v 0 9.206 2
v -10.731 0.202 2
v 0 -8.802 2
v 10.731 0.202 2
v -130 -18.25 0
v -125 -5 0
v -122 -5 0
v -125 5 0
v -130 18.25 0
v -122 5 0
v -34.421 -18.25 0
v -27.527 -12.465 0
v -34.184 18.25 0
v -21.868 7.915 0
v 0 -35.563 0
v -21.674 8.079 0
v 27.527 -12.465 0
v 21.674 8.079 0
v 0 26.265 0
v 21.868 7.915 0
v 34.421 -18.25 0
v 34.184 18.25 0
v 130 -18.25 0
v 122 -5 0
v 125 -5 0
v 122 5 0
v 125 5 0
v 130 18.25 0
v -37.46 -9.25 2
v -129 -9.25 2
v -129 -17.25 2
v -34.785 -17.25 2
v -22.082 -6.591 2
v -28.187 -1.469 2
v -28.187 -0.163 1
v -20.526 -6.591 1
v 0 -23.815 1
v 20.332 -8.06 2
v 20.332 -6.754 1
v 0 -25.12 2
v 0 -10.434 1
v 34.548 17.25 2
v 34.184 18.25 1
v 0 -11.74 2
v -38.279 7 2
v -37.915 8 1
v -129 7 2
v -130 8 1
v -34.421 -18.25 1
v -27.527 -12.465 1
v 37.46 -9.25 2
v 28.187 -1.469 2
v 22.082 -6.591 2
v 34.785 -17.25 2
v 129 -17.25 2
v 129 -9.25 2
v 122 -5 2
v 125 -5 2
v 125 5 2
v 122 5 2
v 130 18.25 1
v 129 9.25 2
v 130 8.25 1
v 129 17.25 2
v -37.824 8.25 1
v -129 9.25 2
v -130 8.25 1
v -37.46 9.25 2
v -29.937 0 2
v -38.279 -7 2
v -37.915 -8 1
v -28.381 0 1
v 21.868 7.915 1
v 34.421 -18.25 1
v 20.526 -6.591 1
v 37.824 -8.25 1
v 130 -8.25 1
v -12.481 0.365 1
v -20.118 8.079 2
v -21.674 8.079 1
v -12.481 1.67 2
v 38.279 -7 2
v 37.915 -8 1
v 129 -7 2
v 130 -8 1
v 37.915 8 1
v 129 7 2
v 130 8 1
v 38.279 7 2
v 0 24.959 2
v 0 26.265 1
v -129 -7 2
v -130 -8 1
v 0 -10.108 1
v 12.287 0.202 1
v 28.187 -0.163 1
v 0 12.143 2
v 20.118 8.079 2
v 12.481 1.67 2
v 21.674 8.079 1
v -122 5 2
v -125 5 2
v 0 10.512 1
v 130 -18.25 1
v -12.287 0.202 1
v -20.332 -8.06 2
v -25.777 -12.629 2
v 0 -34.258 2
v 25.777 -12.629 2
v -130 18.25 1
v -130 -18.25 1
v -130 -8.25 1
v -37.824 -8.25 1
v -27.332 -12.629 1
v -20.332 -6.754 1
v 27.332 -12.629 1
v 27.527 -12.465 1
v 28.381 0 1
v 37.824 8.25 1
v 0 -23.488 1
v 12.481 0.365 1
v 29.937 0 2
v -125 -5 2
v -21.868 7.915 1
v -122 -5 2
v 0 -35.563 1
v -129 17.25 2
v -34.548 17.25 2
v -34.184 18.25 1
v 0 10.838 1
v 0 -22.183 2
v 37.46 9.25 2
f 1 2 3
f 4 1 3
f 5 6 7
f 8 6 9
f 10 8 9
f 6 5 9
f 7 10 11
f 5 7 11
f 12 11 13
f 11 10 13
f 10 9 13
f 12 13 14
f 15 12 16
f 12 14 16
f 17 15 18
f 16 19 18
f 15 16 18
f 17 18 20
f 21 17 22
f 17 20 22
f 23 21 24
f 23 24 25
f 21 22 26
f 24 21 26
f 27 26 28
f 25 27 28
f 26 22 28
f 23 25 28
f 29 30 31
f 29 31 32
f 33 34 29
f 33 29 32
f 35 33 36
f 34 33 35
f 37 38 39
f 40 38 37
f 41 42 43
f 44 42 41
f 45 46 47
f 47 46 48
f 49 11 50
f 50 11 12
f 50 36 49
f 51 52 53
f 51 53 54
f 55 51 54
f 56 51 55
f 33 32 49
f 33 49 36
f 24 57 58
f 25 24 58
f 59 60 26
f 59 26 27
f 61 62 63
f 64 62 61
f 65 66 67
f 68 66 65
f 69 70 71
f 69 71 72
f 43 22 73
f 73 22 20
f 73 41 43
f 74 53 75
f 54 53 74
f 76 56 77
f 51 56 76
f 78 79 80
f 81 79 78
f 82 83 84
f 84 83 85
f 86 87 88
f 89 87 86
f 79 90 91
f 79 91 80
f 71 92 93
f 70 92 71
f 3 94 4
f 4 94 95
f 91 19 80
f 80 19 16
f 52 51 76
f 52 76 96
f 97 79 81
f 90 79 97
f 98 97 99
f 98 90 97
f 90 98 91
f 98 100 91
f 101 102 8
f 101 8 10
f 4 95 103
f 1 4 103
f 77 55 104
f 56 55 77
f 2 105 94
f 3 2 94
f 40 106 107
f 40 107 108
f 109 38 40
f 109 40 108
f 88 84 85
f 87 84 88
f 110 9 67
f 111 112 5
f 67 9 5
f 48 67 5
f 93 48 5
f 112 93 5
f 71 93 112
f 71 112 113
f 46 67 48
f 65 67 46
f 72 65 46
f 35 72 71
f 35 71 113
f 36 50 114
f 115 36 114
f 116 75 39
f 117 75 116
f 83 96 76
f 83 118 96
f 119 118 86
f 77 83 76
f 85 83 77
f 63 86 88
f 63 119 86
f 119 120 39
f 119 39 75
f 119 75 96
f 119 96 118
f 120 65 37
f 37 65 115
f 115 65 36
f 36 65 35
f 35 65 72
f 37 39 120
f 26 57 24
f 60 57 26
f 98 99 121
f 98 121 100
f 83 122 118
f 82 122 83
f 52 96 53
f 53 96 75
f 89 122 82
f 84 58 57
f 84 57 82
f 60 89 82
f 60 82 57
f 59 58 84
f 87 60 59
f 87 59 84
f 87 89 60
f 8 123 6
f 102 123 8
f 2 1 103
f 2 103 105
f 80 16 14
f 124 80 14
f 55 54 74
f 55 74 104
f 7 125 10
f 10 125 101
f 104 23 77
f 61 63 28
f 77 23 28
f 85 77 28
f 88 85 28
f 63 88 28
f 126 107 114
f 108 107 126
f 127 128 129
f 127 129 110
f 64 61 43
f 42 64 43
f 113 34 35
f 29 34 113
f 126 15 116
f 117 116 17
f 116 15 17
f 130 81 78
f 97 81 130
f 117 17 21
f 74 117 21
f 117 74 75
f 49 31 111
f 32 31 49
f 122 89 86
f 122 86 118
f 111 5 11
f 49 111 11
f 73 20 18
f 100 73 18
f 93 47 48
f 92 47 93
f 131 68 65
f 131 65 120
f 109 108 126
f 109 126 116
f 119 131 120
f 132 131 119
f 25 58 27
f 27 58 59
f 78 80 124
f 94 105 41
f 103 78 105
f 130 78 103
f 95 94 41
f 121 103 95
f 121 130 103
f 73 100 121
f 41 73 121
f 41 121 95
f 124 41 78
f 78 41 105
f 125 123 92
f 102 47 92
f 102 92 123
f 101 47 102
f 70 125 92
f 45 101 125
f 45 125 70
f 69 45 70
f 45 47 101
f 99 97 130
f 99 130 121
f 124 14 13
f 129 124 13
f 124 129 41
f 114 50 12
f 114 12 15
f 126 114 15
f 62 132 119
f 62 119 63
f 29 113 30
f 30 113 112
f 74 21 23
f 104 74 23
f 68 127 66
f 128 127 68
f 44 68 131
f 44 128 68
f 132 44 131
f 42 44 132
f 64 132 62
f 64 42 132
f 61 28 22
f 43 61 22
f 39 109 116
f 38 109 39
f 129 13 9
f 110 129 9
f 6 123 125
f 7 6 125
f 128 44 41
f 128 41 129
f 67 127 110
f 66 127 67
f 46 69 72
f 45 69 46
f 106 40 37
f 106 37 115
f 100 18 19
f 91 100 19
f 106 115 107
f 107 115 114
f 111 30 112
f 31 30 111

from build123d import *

# Parameters (mm, degrees)
F1_DEPTH  = 2
F3_DEPTH  = 2
F5_DEPTH  = 2
F7_DEPTH  = 2
F9_DEPTH  = 1
F10_SIZE  = 0.99999
F11_W     = 3
F11_H     = 10
F12_DEPTH = 2


# Not quite as in the source:
# - a fillet or chamfer is up to 0.001 mm smaller than in the source, because OpenCascade refuses the exact size


with BuildPart() as f1:
    # F0 (on Top) → F1 (new body)
    with BuildSketch(Plane.XY):
        Polygon((37.9150851114, 8), (28.3810563706, 0), (37.9150851114, -8), (130, -8), (130, 0), (130, 8), align=None)
    extrude(amount=F1_DEPTH)



with BuildPart() as f1b:
    # F0 (on Top) → F1, piece 2 (new body)
    with BuildSketch(Plane.XY):
        Polygon((-37.9150851114, -8), (-28.3810563706, 0), (-37.9150851114, 8), (-130, 8), (-130, 0), (-130, -8), align=None)
    extrude(amount=F1_DEPTH)


with BuildPart() as f3:
    # F2 (on Top) → F3 (new body)
    with BuildSketch(Plane.XY):
        Polygon((-37.8240925528, 8.25), (0, -23.4881821107), (37.8240925528, 8.25), (130, 8.25), (130, 18.25), (34.1843902102, 18.25), (0, -10.4341092174), (-34.1843902102, 18.25), (-130, 18.25), (-130, 8.25), align=None)
    extrude(amount=F3_DEPTH)


with BuildPart() as f5:
    # F4 (on Top) → F5 (new body)
    with BuildSketch(Plane.XY):
        Polygon((12.4810478052, 0.365085215), (21.6735811226, 8.0785365312), (0, 26.2648304575), (-21.6735811226, 8.0785365312), (-12.4810478052, 0.365085215), (0, 10.8379278251), align=None)
    extrude(amount=F5_DEPTH)


with BuildPart() as f5b:
    # F4 (on Top) → F5, piece 2 (new body)
    with BuildSketch(Plane.XY):
        Polygon((37.8240925528, -8.25), (28.1865908923, -0.1631759112), (20.5261464611, -6.591052008), (34.4207396164, -18.25), (130, -18.25), (130, -8.25), align=None)
    extrude(amount=F5_DEPTH)


with BuildPart() as f5c:
    # F4 (on Top) → F5, piece 3 (new body)
    with BuildSketch(Plane.XY):
        Polygon((-130, -18.25), (-34.4207396164, -18.25), (-20.5261464611, -6.591052008), (-28.1865908923, -0.1631759112), (-37.8240925528, -8.25), (-130, -8.25), align=None)
    extrude(amount=F5_DEPTH)


with BuildPart() as f7:
    # F6 (on Top) → F7 (new body)
    with BuildSketch(Plane.XY):
        Polygon((-27.3324382036, -12.6285607212), (0, -35.563199537), (27.3324382036, -12.6285607212), (20.3316809827, -6.7542279192), (0, -23.814533933), (-20.3316809827, -6.7542279192), align=None)
    extrude(amount=F7_DEPTH)


with BuildPart() as f7b:
    # F6 (on Top) → F7, piece 2 (new body)
    with BuildSketch(Plane.XY):
        Polygon((-12.2865823268, 0.2019093038), (0, -10.107757395), (12.2865823268, 0.2019093038), (0, 10.5115760027), align=None)
    extrude(amount=F7_DEPTH)


with BuildPart() as f1_1:
    add(f1.part)

    add(f1b.part)  # F9 merges F1b

    add(f3.part)  # F9 merges F3

    add(f5.part)  # F9 merges F5

    add(f5b.part)  # F9 merges F5b

    add(f5c.part)  # F9 merges F5c

    add(f7.part)  # F9 merges F7

    add(f7b.part)  # F9 merges F7b
    # F8 (on Top) → F9 (join)
    with BuildSketch(Plane.XY):
        Polygon((21.868046601, 7.9153606201), (0, 26.2648304575), (-21.868046601, 7.9153606201), (-34.1843902102, 18.25), (-130, 18.25), (-130, -18.25), (-34.4207396164, -18.25), (-27.526903682, -12.46538481), (0, -35.563199537), (27.526903682, -12.46538481), (34.4207396164, -18.25), (130, -18.25), (130, 18.25), (34.1843902102, 18.25), align=None)
    extrude(amount=F9_DEPTH)

    # F10 (size 1 in the source; OpenCascade refuses exactly that, so slightly less here)
    f10_edges = [f1_1.edges().sort_by_distance(p)[0] for p in [
        (-18.912046, -7.619091, 2),
        (18.912046, -7.619091, 2),
        (83.912046, 8.25, 2),
        (130, 13.25, 2),
        (82.092195, 18.25, 2),
        (17.092195, 3.907945, 2),
        (-17.092195, 3.907945, 2),
        (-82.092195, 18.25, 2),
        (-130, 13.25, 2),
        (-83.912046, 8.25, 2),
        (-33.148071, -4, 2),
        (-33.148071, 4, 2),
        (-83.957543, 8, 2),
        (-130, 0, 2),
        (-83.957543, -8, 2),
        (-83.912046, -8.25, 2),
        (-130, -13.25, 2),
        (-82.21037, -18.25, 2),
        (-27.473443, -12.420526, 2),
        (-24.356369, -3.377114, 2),
        (-33.005342, -4.206588, 2),
        (6.240524, 5.601507, 2),
        (17.077314, 4.221811, 2),
        (10.836791, 17.171683, 2),
        (-10.836791, 17.171683, 2),
        (-17.077314, 4.221811, 2),
        (-6.240524, 5.601507, 2),
        (-6.143291, -4.952924, 2),
        (6.143291, -4.952924, 2),
        (6.143291, 5.356743, 2),
        (-6.143291, 5.356743, 2),
        (-23.83206, -9.691394, 2),
        (-13.666219, -24.09588, 2),
        (13.666219, -24.09588, 2),
        (23.83206, -9.691394, 2),
        (10.16584, -15.284381, 2),
        (-10.16584, -15.284381, 2),
        (33.005342, -4.206588, 2),
        (24.356369, -3.377114, 2),
        (27.473443, -12.420526, 2),
        (82.21037, -18.25, 2),
        (130, -13.25, 2),
        (83.912046, -8.25, 2),
        (33.148071, 4, 2),
        (33.148071, -4, 2),
        (83.957543, -8, 2),
        (130, 0, 2),
        (83.957543, 8, 2),
    ]]
    chamfer(f10_edges, length=F10_SIZE)

    # F11 (on face) → F12 (cut, through all)
    with BuildSketch(Plane.XY.offset(2)):
        with Locations((123.5, 0)):
            Rectangle(F11_W, F11_H)
        with Locations((-123.5, 0)):
            Rectangle(F11_W, F11_H)
    extrude(amount=-F12_DEPTH, mode=Mode.SUBTRACT)


solid = f1_1.part
